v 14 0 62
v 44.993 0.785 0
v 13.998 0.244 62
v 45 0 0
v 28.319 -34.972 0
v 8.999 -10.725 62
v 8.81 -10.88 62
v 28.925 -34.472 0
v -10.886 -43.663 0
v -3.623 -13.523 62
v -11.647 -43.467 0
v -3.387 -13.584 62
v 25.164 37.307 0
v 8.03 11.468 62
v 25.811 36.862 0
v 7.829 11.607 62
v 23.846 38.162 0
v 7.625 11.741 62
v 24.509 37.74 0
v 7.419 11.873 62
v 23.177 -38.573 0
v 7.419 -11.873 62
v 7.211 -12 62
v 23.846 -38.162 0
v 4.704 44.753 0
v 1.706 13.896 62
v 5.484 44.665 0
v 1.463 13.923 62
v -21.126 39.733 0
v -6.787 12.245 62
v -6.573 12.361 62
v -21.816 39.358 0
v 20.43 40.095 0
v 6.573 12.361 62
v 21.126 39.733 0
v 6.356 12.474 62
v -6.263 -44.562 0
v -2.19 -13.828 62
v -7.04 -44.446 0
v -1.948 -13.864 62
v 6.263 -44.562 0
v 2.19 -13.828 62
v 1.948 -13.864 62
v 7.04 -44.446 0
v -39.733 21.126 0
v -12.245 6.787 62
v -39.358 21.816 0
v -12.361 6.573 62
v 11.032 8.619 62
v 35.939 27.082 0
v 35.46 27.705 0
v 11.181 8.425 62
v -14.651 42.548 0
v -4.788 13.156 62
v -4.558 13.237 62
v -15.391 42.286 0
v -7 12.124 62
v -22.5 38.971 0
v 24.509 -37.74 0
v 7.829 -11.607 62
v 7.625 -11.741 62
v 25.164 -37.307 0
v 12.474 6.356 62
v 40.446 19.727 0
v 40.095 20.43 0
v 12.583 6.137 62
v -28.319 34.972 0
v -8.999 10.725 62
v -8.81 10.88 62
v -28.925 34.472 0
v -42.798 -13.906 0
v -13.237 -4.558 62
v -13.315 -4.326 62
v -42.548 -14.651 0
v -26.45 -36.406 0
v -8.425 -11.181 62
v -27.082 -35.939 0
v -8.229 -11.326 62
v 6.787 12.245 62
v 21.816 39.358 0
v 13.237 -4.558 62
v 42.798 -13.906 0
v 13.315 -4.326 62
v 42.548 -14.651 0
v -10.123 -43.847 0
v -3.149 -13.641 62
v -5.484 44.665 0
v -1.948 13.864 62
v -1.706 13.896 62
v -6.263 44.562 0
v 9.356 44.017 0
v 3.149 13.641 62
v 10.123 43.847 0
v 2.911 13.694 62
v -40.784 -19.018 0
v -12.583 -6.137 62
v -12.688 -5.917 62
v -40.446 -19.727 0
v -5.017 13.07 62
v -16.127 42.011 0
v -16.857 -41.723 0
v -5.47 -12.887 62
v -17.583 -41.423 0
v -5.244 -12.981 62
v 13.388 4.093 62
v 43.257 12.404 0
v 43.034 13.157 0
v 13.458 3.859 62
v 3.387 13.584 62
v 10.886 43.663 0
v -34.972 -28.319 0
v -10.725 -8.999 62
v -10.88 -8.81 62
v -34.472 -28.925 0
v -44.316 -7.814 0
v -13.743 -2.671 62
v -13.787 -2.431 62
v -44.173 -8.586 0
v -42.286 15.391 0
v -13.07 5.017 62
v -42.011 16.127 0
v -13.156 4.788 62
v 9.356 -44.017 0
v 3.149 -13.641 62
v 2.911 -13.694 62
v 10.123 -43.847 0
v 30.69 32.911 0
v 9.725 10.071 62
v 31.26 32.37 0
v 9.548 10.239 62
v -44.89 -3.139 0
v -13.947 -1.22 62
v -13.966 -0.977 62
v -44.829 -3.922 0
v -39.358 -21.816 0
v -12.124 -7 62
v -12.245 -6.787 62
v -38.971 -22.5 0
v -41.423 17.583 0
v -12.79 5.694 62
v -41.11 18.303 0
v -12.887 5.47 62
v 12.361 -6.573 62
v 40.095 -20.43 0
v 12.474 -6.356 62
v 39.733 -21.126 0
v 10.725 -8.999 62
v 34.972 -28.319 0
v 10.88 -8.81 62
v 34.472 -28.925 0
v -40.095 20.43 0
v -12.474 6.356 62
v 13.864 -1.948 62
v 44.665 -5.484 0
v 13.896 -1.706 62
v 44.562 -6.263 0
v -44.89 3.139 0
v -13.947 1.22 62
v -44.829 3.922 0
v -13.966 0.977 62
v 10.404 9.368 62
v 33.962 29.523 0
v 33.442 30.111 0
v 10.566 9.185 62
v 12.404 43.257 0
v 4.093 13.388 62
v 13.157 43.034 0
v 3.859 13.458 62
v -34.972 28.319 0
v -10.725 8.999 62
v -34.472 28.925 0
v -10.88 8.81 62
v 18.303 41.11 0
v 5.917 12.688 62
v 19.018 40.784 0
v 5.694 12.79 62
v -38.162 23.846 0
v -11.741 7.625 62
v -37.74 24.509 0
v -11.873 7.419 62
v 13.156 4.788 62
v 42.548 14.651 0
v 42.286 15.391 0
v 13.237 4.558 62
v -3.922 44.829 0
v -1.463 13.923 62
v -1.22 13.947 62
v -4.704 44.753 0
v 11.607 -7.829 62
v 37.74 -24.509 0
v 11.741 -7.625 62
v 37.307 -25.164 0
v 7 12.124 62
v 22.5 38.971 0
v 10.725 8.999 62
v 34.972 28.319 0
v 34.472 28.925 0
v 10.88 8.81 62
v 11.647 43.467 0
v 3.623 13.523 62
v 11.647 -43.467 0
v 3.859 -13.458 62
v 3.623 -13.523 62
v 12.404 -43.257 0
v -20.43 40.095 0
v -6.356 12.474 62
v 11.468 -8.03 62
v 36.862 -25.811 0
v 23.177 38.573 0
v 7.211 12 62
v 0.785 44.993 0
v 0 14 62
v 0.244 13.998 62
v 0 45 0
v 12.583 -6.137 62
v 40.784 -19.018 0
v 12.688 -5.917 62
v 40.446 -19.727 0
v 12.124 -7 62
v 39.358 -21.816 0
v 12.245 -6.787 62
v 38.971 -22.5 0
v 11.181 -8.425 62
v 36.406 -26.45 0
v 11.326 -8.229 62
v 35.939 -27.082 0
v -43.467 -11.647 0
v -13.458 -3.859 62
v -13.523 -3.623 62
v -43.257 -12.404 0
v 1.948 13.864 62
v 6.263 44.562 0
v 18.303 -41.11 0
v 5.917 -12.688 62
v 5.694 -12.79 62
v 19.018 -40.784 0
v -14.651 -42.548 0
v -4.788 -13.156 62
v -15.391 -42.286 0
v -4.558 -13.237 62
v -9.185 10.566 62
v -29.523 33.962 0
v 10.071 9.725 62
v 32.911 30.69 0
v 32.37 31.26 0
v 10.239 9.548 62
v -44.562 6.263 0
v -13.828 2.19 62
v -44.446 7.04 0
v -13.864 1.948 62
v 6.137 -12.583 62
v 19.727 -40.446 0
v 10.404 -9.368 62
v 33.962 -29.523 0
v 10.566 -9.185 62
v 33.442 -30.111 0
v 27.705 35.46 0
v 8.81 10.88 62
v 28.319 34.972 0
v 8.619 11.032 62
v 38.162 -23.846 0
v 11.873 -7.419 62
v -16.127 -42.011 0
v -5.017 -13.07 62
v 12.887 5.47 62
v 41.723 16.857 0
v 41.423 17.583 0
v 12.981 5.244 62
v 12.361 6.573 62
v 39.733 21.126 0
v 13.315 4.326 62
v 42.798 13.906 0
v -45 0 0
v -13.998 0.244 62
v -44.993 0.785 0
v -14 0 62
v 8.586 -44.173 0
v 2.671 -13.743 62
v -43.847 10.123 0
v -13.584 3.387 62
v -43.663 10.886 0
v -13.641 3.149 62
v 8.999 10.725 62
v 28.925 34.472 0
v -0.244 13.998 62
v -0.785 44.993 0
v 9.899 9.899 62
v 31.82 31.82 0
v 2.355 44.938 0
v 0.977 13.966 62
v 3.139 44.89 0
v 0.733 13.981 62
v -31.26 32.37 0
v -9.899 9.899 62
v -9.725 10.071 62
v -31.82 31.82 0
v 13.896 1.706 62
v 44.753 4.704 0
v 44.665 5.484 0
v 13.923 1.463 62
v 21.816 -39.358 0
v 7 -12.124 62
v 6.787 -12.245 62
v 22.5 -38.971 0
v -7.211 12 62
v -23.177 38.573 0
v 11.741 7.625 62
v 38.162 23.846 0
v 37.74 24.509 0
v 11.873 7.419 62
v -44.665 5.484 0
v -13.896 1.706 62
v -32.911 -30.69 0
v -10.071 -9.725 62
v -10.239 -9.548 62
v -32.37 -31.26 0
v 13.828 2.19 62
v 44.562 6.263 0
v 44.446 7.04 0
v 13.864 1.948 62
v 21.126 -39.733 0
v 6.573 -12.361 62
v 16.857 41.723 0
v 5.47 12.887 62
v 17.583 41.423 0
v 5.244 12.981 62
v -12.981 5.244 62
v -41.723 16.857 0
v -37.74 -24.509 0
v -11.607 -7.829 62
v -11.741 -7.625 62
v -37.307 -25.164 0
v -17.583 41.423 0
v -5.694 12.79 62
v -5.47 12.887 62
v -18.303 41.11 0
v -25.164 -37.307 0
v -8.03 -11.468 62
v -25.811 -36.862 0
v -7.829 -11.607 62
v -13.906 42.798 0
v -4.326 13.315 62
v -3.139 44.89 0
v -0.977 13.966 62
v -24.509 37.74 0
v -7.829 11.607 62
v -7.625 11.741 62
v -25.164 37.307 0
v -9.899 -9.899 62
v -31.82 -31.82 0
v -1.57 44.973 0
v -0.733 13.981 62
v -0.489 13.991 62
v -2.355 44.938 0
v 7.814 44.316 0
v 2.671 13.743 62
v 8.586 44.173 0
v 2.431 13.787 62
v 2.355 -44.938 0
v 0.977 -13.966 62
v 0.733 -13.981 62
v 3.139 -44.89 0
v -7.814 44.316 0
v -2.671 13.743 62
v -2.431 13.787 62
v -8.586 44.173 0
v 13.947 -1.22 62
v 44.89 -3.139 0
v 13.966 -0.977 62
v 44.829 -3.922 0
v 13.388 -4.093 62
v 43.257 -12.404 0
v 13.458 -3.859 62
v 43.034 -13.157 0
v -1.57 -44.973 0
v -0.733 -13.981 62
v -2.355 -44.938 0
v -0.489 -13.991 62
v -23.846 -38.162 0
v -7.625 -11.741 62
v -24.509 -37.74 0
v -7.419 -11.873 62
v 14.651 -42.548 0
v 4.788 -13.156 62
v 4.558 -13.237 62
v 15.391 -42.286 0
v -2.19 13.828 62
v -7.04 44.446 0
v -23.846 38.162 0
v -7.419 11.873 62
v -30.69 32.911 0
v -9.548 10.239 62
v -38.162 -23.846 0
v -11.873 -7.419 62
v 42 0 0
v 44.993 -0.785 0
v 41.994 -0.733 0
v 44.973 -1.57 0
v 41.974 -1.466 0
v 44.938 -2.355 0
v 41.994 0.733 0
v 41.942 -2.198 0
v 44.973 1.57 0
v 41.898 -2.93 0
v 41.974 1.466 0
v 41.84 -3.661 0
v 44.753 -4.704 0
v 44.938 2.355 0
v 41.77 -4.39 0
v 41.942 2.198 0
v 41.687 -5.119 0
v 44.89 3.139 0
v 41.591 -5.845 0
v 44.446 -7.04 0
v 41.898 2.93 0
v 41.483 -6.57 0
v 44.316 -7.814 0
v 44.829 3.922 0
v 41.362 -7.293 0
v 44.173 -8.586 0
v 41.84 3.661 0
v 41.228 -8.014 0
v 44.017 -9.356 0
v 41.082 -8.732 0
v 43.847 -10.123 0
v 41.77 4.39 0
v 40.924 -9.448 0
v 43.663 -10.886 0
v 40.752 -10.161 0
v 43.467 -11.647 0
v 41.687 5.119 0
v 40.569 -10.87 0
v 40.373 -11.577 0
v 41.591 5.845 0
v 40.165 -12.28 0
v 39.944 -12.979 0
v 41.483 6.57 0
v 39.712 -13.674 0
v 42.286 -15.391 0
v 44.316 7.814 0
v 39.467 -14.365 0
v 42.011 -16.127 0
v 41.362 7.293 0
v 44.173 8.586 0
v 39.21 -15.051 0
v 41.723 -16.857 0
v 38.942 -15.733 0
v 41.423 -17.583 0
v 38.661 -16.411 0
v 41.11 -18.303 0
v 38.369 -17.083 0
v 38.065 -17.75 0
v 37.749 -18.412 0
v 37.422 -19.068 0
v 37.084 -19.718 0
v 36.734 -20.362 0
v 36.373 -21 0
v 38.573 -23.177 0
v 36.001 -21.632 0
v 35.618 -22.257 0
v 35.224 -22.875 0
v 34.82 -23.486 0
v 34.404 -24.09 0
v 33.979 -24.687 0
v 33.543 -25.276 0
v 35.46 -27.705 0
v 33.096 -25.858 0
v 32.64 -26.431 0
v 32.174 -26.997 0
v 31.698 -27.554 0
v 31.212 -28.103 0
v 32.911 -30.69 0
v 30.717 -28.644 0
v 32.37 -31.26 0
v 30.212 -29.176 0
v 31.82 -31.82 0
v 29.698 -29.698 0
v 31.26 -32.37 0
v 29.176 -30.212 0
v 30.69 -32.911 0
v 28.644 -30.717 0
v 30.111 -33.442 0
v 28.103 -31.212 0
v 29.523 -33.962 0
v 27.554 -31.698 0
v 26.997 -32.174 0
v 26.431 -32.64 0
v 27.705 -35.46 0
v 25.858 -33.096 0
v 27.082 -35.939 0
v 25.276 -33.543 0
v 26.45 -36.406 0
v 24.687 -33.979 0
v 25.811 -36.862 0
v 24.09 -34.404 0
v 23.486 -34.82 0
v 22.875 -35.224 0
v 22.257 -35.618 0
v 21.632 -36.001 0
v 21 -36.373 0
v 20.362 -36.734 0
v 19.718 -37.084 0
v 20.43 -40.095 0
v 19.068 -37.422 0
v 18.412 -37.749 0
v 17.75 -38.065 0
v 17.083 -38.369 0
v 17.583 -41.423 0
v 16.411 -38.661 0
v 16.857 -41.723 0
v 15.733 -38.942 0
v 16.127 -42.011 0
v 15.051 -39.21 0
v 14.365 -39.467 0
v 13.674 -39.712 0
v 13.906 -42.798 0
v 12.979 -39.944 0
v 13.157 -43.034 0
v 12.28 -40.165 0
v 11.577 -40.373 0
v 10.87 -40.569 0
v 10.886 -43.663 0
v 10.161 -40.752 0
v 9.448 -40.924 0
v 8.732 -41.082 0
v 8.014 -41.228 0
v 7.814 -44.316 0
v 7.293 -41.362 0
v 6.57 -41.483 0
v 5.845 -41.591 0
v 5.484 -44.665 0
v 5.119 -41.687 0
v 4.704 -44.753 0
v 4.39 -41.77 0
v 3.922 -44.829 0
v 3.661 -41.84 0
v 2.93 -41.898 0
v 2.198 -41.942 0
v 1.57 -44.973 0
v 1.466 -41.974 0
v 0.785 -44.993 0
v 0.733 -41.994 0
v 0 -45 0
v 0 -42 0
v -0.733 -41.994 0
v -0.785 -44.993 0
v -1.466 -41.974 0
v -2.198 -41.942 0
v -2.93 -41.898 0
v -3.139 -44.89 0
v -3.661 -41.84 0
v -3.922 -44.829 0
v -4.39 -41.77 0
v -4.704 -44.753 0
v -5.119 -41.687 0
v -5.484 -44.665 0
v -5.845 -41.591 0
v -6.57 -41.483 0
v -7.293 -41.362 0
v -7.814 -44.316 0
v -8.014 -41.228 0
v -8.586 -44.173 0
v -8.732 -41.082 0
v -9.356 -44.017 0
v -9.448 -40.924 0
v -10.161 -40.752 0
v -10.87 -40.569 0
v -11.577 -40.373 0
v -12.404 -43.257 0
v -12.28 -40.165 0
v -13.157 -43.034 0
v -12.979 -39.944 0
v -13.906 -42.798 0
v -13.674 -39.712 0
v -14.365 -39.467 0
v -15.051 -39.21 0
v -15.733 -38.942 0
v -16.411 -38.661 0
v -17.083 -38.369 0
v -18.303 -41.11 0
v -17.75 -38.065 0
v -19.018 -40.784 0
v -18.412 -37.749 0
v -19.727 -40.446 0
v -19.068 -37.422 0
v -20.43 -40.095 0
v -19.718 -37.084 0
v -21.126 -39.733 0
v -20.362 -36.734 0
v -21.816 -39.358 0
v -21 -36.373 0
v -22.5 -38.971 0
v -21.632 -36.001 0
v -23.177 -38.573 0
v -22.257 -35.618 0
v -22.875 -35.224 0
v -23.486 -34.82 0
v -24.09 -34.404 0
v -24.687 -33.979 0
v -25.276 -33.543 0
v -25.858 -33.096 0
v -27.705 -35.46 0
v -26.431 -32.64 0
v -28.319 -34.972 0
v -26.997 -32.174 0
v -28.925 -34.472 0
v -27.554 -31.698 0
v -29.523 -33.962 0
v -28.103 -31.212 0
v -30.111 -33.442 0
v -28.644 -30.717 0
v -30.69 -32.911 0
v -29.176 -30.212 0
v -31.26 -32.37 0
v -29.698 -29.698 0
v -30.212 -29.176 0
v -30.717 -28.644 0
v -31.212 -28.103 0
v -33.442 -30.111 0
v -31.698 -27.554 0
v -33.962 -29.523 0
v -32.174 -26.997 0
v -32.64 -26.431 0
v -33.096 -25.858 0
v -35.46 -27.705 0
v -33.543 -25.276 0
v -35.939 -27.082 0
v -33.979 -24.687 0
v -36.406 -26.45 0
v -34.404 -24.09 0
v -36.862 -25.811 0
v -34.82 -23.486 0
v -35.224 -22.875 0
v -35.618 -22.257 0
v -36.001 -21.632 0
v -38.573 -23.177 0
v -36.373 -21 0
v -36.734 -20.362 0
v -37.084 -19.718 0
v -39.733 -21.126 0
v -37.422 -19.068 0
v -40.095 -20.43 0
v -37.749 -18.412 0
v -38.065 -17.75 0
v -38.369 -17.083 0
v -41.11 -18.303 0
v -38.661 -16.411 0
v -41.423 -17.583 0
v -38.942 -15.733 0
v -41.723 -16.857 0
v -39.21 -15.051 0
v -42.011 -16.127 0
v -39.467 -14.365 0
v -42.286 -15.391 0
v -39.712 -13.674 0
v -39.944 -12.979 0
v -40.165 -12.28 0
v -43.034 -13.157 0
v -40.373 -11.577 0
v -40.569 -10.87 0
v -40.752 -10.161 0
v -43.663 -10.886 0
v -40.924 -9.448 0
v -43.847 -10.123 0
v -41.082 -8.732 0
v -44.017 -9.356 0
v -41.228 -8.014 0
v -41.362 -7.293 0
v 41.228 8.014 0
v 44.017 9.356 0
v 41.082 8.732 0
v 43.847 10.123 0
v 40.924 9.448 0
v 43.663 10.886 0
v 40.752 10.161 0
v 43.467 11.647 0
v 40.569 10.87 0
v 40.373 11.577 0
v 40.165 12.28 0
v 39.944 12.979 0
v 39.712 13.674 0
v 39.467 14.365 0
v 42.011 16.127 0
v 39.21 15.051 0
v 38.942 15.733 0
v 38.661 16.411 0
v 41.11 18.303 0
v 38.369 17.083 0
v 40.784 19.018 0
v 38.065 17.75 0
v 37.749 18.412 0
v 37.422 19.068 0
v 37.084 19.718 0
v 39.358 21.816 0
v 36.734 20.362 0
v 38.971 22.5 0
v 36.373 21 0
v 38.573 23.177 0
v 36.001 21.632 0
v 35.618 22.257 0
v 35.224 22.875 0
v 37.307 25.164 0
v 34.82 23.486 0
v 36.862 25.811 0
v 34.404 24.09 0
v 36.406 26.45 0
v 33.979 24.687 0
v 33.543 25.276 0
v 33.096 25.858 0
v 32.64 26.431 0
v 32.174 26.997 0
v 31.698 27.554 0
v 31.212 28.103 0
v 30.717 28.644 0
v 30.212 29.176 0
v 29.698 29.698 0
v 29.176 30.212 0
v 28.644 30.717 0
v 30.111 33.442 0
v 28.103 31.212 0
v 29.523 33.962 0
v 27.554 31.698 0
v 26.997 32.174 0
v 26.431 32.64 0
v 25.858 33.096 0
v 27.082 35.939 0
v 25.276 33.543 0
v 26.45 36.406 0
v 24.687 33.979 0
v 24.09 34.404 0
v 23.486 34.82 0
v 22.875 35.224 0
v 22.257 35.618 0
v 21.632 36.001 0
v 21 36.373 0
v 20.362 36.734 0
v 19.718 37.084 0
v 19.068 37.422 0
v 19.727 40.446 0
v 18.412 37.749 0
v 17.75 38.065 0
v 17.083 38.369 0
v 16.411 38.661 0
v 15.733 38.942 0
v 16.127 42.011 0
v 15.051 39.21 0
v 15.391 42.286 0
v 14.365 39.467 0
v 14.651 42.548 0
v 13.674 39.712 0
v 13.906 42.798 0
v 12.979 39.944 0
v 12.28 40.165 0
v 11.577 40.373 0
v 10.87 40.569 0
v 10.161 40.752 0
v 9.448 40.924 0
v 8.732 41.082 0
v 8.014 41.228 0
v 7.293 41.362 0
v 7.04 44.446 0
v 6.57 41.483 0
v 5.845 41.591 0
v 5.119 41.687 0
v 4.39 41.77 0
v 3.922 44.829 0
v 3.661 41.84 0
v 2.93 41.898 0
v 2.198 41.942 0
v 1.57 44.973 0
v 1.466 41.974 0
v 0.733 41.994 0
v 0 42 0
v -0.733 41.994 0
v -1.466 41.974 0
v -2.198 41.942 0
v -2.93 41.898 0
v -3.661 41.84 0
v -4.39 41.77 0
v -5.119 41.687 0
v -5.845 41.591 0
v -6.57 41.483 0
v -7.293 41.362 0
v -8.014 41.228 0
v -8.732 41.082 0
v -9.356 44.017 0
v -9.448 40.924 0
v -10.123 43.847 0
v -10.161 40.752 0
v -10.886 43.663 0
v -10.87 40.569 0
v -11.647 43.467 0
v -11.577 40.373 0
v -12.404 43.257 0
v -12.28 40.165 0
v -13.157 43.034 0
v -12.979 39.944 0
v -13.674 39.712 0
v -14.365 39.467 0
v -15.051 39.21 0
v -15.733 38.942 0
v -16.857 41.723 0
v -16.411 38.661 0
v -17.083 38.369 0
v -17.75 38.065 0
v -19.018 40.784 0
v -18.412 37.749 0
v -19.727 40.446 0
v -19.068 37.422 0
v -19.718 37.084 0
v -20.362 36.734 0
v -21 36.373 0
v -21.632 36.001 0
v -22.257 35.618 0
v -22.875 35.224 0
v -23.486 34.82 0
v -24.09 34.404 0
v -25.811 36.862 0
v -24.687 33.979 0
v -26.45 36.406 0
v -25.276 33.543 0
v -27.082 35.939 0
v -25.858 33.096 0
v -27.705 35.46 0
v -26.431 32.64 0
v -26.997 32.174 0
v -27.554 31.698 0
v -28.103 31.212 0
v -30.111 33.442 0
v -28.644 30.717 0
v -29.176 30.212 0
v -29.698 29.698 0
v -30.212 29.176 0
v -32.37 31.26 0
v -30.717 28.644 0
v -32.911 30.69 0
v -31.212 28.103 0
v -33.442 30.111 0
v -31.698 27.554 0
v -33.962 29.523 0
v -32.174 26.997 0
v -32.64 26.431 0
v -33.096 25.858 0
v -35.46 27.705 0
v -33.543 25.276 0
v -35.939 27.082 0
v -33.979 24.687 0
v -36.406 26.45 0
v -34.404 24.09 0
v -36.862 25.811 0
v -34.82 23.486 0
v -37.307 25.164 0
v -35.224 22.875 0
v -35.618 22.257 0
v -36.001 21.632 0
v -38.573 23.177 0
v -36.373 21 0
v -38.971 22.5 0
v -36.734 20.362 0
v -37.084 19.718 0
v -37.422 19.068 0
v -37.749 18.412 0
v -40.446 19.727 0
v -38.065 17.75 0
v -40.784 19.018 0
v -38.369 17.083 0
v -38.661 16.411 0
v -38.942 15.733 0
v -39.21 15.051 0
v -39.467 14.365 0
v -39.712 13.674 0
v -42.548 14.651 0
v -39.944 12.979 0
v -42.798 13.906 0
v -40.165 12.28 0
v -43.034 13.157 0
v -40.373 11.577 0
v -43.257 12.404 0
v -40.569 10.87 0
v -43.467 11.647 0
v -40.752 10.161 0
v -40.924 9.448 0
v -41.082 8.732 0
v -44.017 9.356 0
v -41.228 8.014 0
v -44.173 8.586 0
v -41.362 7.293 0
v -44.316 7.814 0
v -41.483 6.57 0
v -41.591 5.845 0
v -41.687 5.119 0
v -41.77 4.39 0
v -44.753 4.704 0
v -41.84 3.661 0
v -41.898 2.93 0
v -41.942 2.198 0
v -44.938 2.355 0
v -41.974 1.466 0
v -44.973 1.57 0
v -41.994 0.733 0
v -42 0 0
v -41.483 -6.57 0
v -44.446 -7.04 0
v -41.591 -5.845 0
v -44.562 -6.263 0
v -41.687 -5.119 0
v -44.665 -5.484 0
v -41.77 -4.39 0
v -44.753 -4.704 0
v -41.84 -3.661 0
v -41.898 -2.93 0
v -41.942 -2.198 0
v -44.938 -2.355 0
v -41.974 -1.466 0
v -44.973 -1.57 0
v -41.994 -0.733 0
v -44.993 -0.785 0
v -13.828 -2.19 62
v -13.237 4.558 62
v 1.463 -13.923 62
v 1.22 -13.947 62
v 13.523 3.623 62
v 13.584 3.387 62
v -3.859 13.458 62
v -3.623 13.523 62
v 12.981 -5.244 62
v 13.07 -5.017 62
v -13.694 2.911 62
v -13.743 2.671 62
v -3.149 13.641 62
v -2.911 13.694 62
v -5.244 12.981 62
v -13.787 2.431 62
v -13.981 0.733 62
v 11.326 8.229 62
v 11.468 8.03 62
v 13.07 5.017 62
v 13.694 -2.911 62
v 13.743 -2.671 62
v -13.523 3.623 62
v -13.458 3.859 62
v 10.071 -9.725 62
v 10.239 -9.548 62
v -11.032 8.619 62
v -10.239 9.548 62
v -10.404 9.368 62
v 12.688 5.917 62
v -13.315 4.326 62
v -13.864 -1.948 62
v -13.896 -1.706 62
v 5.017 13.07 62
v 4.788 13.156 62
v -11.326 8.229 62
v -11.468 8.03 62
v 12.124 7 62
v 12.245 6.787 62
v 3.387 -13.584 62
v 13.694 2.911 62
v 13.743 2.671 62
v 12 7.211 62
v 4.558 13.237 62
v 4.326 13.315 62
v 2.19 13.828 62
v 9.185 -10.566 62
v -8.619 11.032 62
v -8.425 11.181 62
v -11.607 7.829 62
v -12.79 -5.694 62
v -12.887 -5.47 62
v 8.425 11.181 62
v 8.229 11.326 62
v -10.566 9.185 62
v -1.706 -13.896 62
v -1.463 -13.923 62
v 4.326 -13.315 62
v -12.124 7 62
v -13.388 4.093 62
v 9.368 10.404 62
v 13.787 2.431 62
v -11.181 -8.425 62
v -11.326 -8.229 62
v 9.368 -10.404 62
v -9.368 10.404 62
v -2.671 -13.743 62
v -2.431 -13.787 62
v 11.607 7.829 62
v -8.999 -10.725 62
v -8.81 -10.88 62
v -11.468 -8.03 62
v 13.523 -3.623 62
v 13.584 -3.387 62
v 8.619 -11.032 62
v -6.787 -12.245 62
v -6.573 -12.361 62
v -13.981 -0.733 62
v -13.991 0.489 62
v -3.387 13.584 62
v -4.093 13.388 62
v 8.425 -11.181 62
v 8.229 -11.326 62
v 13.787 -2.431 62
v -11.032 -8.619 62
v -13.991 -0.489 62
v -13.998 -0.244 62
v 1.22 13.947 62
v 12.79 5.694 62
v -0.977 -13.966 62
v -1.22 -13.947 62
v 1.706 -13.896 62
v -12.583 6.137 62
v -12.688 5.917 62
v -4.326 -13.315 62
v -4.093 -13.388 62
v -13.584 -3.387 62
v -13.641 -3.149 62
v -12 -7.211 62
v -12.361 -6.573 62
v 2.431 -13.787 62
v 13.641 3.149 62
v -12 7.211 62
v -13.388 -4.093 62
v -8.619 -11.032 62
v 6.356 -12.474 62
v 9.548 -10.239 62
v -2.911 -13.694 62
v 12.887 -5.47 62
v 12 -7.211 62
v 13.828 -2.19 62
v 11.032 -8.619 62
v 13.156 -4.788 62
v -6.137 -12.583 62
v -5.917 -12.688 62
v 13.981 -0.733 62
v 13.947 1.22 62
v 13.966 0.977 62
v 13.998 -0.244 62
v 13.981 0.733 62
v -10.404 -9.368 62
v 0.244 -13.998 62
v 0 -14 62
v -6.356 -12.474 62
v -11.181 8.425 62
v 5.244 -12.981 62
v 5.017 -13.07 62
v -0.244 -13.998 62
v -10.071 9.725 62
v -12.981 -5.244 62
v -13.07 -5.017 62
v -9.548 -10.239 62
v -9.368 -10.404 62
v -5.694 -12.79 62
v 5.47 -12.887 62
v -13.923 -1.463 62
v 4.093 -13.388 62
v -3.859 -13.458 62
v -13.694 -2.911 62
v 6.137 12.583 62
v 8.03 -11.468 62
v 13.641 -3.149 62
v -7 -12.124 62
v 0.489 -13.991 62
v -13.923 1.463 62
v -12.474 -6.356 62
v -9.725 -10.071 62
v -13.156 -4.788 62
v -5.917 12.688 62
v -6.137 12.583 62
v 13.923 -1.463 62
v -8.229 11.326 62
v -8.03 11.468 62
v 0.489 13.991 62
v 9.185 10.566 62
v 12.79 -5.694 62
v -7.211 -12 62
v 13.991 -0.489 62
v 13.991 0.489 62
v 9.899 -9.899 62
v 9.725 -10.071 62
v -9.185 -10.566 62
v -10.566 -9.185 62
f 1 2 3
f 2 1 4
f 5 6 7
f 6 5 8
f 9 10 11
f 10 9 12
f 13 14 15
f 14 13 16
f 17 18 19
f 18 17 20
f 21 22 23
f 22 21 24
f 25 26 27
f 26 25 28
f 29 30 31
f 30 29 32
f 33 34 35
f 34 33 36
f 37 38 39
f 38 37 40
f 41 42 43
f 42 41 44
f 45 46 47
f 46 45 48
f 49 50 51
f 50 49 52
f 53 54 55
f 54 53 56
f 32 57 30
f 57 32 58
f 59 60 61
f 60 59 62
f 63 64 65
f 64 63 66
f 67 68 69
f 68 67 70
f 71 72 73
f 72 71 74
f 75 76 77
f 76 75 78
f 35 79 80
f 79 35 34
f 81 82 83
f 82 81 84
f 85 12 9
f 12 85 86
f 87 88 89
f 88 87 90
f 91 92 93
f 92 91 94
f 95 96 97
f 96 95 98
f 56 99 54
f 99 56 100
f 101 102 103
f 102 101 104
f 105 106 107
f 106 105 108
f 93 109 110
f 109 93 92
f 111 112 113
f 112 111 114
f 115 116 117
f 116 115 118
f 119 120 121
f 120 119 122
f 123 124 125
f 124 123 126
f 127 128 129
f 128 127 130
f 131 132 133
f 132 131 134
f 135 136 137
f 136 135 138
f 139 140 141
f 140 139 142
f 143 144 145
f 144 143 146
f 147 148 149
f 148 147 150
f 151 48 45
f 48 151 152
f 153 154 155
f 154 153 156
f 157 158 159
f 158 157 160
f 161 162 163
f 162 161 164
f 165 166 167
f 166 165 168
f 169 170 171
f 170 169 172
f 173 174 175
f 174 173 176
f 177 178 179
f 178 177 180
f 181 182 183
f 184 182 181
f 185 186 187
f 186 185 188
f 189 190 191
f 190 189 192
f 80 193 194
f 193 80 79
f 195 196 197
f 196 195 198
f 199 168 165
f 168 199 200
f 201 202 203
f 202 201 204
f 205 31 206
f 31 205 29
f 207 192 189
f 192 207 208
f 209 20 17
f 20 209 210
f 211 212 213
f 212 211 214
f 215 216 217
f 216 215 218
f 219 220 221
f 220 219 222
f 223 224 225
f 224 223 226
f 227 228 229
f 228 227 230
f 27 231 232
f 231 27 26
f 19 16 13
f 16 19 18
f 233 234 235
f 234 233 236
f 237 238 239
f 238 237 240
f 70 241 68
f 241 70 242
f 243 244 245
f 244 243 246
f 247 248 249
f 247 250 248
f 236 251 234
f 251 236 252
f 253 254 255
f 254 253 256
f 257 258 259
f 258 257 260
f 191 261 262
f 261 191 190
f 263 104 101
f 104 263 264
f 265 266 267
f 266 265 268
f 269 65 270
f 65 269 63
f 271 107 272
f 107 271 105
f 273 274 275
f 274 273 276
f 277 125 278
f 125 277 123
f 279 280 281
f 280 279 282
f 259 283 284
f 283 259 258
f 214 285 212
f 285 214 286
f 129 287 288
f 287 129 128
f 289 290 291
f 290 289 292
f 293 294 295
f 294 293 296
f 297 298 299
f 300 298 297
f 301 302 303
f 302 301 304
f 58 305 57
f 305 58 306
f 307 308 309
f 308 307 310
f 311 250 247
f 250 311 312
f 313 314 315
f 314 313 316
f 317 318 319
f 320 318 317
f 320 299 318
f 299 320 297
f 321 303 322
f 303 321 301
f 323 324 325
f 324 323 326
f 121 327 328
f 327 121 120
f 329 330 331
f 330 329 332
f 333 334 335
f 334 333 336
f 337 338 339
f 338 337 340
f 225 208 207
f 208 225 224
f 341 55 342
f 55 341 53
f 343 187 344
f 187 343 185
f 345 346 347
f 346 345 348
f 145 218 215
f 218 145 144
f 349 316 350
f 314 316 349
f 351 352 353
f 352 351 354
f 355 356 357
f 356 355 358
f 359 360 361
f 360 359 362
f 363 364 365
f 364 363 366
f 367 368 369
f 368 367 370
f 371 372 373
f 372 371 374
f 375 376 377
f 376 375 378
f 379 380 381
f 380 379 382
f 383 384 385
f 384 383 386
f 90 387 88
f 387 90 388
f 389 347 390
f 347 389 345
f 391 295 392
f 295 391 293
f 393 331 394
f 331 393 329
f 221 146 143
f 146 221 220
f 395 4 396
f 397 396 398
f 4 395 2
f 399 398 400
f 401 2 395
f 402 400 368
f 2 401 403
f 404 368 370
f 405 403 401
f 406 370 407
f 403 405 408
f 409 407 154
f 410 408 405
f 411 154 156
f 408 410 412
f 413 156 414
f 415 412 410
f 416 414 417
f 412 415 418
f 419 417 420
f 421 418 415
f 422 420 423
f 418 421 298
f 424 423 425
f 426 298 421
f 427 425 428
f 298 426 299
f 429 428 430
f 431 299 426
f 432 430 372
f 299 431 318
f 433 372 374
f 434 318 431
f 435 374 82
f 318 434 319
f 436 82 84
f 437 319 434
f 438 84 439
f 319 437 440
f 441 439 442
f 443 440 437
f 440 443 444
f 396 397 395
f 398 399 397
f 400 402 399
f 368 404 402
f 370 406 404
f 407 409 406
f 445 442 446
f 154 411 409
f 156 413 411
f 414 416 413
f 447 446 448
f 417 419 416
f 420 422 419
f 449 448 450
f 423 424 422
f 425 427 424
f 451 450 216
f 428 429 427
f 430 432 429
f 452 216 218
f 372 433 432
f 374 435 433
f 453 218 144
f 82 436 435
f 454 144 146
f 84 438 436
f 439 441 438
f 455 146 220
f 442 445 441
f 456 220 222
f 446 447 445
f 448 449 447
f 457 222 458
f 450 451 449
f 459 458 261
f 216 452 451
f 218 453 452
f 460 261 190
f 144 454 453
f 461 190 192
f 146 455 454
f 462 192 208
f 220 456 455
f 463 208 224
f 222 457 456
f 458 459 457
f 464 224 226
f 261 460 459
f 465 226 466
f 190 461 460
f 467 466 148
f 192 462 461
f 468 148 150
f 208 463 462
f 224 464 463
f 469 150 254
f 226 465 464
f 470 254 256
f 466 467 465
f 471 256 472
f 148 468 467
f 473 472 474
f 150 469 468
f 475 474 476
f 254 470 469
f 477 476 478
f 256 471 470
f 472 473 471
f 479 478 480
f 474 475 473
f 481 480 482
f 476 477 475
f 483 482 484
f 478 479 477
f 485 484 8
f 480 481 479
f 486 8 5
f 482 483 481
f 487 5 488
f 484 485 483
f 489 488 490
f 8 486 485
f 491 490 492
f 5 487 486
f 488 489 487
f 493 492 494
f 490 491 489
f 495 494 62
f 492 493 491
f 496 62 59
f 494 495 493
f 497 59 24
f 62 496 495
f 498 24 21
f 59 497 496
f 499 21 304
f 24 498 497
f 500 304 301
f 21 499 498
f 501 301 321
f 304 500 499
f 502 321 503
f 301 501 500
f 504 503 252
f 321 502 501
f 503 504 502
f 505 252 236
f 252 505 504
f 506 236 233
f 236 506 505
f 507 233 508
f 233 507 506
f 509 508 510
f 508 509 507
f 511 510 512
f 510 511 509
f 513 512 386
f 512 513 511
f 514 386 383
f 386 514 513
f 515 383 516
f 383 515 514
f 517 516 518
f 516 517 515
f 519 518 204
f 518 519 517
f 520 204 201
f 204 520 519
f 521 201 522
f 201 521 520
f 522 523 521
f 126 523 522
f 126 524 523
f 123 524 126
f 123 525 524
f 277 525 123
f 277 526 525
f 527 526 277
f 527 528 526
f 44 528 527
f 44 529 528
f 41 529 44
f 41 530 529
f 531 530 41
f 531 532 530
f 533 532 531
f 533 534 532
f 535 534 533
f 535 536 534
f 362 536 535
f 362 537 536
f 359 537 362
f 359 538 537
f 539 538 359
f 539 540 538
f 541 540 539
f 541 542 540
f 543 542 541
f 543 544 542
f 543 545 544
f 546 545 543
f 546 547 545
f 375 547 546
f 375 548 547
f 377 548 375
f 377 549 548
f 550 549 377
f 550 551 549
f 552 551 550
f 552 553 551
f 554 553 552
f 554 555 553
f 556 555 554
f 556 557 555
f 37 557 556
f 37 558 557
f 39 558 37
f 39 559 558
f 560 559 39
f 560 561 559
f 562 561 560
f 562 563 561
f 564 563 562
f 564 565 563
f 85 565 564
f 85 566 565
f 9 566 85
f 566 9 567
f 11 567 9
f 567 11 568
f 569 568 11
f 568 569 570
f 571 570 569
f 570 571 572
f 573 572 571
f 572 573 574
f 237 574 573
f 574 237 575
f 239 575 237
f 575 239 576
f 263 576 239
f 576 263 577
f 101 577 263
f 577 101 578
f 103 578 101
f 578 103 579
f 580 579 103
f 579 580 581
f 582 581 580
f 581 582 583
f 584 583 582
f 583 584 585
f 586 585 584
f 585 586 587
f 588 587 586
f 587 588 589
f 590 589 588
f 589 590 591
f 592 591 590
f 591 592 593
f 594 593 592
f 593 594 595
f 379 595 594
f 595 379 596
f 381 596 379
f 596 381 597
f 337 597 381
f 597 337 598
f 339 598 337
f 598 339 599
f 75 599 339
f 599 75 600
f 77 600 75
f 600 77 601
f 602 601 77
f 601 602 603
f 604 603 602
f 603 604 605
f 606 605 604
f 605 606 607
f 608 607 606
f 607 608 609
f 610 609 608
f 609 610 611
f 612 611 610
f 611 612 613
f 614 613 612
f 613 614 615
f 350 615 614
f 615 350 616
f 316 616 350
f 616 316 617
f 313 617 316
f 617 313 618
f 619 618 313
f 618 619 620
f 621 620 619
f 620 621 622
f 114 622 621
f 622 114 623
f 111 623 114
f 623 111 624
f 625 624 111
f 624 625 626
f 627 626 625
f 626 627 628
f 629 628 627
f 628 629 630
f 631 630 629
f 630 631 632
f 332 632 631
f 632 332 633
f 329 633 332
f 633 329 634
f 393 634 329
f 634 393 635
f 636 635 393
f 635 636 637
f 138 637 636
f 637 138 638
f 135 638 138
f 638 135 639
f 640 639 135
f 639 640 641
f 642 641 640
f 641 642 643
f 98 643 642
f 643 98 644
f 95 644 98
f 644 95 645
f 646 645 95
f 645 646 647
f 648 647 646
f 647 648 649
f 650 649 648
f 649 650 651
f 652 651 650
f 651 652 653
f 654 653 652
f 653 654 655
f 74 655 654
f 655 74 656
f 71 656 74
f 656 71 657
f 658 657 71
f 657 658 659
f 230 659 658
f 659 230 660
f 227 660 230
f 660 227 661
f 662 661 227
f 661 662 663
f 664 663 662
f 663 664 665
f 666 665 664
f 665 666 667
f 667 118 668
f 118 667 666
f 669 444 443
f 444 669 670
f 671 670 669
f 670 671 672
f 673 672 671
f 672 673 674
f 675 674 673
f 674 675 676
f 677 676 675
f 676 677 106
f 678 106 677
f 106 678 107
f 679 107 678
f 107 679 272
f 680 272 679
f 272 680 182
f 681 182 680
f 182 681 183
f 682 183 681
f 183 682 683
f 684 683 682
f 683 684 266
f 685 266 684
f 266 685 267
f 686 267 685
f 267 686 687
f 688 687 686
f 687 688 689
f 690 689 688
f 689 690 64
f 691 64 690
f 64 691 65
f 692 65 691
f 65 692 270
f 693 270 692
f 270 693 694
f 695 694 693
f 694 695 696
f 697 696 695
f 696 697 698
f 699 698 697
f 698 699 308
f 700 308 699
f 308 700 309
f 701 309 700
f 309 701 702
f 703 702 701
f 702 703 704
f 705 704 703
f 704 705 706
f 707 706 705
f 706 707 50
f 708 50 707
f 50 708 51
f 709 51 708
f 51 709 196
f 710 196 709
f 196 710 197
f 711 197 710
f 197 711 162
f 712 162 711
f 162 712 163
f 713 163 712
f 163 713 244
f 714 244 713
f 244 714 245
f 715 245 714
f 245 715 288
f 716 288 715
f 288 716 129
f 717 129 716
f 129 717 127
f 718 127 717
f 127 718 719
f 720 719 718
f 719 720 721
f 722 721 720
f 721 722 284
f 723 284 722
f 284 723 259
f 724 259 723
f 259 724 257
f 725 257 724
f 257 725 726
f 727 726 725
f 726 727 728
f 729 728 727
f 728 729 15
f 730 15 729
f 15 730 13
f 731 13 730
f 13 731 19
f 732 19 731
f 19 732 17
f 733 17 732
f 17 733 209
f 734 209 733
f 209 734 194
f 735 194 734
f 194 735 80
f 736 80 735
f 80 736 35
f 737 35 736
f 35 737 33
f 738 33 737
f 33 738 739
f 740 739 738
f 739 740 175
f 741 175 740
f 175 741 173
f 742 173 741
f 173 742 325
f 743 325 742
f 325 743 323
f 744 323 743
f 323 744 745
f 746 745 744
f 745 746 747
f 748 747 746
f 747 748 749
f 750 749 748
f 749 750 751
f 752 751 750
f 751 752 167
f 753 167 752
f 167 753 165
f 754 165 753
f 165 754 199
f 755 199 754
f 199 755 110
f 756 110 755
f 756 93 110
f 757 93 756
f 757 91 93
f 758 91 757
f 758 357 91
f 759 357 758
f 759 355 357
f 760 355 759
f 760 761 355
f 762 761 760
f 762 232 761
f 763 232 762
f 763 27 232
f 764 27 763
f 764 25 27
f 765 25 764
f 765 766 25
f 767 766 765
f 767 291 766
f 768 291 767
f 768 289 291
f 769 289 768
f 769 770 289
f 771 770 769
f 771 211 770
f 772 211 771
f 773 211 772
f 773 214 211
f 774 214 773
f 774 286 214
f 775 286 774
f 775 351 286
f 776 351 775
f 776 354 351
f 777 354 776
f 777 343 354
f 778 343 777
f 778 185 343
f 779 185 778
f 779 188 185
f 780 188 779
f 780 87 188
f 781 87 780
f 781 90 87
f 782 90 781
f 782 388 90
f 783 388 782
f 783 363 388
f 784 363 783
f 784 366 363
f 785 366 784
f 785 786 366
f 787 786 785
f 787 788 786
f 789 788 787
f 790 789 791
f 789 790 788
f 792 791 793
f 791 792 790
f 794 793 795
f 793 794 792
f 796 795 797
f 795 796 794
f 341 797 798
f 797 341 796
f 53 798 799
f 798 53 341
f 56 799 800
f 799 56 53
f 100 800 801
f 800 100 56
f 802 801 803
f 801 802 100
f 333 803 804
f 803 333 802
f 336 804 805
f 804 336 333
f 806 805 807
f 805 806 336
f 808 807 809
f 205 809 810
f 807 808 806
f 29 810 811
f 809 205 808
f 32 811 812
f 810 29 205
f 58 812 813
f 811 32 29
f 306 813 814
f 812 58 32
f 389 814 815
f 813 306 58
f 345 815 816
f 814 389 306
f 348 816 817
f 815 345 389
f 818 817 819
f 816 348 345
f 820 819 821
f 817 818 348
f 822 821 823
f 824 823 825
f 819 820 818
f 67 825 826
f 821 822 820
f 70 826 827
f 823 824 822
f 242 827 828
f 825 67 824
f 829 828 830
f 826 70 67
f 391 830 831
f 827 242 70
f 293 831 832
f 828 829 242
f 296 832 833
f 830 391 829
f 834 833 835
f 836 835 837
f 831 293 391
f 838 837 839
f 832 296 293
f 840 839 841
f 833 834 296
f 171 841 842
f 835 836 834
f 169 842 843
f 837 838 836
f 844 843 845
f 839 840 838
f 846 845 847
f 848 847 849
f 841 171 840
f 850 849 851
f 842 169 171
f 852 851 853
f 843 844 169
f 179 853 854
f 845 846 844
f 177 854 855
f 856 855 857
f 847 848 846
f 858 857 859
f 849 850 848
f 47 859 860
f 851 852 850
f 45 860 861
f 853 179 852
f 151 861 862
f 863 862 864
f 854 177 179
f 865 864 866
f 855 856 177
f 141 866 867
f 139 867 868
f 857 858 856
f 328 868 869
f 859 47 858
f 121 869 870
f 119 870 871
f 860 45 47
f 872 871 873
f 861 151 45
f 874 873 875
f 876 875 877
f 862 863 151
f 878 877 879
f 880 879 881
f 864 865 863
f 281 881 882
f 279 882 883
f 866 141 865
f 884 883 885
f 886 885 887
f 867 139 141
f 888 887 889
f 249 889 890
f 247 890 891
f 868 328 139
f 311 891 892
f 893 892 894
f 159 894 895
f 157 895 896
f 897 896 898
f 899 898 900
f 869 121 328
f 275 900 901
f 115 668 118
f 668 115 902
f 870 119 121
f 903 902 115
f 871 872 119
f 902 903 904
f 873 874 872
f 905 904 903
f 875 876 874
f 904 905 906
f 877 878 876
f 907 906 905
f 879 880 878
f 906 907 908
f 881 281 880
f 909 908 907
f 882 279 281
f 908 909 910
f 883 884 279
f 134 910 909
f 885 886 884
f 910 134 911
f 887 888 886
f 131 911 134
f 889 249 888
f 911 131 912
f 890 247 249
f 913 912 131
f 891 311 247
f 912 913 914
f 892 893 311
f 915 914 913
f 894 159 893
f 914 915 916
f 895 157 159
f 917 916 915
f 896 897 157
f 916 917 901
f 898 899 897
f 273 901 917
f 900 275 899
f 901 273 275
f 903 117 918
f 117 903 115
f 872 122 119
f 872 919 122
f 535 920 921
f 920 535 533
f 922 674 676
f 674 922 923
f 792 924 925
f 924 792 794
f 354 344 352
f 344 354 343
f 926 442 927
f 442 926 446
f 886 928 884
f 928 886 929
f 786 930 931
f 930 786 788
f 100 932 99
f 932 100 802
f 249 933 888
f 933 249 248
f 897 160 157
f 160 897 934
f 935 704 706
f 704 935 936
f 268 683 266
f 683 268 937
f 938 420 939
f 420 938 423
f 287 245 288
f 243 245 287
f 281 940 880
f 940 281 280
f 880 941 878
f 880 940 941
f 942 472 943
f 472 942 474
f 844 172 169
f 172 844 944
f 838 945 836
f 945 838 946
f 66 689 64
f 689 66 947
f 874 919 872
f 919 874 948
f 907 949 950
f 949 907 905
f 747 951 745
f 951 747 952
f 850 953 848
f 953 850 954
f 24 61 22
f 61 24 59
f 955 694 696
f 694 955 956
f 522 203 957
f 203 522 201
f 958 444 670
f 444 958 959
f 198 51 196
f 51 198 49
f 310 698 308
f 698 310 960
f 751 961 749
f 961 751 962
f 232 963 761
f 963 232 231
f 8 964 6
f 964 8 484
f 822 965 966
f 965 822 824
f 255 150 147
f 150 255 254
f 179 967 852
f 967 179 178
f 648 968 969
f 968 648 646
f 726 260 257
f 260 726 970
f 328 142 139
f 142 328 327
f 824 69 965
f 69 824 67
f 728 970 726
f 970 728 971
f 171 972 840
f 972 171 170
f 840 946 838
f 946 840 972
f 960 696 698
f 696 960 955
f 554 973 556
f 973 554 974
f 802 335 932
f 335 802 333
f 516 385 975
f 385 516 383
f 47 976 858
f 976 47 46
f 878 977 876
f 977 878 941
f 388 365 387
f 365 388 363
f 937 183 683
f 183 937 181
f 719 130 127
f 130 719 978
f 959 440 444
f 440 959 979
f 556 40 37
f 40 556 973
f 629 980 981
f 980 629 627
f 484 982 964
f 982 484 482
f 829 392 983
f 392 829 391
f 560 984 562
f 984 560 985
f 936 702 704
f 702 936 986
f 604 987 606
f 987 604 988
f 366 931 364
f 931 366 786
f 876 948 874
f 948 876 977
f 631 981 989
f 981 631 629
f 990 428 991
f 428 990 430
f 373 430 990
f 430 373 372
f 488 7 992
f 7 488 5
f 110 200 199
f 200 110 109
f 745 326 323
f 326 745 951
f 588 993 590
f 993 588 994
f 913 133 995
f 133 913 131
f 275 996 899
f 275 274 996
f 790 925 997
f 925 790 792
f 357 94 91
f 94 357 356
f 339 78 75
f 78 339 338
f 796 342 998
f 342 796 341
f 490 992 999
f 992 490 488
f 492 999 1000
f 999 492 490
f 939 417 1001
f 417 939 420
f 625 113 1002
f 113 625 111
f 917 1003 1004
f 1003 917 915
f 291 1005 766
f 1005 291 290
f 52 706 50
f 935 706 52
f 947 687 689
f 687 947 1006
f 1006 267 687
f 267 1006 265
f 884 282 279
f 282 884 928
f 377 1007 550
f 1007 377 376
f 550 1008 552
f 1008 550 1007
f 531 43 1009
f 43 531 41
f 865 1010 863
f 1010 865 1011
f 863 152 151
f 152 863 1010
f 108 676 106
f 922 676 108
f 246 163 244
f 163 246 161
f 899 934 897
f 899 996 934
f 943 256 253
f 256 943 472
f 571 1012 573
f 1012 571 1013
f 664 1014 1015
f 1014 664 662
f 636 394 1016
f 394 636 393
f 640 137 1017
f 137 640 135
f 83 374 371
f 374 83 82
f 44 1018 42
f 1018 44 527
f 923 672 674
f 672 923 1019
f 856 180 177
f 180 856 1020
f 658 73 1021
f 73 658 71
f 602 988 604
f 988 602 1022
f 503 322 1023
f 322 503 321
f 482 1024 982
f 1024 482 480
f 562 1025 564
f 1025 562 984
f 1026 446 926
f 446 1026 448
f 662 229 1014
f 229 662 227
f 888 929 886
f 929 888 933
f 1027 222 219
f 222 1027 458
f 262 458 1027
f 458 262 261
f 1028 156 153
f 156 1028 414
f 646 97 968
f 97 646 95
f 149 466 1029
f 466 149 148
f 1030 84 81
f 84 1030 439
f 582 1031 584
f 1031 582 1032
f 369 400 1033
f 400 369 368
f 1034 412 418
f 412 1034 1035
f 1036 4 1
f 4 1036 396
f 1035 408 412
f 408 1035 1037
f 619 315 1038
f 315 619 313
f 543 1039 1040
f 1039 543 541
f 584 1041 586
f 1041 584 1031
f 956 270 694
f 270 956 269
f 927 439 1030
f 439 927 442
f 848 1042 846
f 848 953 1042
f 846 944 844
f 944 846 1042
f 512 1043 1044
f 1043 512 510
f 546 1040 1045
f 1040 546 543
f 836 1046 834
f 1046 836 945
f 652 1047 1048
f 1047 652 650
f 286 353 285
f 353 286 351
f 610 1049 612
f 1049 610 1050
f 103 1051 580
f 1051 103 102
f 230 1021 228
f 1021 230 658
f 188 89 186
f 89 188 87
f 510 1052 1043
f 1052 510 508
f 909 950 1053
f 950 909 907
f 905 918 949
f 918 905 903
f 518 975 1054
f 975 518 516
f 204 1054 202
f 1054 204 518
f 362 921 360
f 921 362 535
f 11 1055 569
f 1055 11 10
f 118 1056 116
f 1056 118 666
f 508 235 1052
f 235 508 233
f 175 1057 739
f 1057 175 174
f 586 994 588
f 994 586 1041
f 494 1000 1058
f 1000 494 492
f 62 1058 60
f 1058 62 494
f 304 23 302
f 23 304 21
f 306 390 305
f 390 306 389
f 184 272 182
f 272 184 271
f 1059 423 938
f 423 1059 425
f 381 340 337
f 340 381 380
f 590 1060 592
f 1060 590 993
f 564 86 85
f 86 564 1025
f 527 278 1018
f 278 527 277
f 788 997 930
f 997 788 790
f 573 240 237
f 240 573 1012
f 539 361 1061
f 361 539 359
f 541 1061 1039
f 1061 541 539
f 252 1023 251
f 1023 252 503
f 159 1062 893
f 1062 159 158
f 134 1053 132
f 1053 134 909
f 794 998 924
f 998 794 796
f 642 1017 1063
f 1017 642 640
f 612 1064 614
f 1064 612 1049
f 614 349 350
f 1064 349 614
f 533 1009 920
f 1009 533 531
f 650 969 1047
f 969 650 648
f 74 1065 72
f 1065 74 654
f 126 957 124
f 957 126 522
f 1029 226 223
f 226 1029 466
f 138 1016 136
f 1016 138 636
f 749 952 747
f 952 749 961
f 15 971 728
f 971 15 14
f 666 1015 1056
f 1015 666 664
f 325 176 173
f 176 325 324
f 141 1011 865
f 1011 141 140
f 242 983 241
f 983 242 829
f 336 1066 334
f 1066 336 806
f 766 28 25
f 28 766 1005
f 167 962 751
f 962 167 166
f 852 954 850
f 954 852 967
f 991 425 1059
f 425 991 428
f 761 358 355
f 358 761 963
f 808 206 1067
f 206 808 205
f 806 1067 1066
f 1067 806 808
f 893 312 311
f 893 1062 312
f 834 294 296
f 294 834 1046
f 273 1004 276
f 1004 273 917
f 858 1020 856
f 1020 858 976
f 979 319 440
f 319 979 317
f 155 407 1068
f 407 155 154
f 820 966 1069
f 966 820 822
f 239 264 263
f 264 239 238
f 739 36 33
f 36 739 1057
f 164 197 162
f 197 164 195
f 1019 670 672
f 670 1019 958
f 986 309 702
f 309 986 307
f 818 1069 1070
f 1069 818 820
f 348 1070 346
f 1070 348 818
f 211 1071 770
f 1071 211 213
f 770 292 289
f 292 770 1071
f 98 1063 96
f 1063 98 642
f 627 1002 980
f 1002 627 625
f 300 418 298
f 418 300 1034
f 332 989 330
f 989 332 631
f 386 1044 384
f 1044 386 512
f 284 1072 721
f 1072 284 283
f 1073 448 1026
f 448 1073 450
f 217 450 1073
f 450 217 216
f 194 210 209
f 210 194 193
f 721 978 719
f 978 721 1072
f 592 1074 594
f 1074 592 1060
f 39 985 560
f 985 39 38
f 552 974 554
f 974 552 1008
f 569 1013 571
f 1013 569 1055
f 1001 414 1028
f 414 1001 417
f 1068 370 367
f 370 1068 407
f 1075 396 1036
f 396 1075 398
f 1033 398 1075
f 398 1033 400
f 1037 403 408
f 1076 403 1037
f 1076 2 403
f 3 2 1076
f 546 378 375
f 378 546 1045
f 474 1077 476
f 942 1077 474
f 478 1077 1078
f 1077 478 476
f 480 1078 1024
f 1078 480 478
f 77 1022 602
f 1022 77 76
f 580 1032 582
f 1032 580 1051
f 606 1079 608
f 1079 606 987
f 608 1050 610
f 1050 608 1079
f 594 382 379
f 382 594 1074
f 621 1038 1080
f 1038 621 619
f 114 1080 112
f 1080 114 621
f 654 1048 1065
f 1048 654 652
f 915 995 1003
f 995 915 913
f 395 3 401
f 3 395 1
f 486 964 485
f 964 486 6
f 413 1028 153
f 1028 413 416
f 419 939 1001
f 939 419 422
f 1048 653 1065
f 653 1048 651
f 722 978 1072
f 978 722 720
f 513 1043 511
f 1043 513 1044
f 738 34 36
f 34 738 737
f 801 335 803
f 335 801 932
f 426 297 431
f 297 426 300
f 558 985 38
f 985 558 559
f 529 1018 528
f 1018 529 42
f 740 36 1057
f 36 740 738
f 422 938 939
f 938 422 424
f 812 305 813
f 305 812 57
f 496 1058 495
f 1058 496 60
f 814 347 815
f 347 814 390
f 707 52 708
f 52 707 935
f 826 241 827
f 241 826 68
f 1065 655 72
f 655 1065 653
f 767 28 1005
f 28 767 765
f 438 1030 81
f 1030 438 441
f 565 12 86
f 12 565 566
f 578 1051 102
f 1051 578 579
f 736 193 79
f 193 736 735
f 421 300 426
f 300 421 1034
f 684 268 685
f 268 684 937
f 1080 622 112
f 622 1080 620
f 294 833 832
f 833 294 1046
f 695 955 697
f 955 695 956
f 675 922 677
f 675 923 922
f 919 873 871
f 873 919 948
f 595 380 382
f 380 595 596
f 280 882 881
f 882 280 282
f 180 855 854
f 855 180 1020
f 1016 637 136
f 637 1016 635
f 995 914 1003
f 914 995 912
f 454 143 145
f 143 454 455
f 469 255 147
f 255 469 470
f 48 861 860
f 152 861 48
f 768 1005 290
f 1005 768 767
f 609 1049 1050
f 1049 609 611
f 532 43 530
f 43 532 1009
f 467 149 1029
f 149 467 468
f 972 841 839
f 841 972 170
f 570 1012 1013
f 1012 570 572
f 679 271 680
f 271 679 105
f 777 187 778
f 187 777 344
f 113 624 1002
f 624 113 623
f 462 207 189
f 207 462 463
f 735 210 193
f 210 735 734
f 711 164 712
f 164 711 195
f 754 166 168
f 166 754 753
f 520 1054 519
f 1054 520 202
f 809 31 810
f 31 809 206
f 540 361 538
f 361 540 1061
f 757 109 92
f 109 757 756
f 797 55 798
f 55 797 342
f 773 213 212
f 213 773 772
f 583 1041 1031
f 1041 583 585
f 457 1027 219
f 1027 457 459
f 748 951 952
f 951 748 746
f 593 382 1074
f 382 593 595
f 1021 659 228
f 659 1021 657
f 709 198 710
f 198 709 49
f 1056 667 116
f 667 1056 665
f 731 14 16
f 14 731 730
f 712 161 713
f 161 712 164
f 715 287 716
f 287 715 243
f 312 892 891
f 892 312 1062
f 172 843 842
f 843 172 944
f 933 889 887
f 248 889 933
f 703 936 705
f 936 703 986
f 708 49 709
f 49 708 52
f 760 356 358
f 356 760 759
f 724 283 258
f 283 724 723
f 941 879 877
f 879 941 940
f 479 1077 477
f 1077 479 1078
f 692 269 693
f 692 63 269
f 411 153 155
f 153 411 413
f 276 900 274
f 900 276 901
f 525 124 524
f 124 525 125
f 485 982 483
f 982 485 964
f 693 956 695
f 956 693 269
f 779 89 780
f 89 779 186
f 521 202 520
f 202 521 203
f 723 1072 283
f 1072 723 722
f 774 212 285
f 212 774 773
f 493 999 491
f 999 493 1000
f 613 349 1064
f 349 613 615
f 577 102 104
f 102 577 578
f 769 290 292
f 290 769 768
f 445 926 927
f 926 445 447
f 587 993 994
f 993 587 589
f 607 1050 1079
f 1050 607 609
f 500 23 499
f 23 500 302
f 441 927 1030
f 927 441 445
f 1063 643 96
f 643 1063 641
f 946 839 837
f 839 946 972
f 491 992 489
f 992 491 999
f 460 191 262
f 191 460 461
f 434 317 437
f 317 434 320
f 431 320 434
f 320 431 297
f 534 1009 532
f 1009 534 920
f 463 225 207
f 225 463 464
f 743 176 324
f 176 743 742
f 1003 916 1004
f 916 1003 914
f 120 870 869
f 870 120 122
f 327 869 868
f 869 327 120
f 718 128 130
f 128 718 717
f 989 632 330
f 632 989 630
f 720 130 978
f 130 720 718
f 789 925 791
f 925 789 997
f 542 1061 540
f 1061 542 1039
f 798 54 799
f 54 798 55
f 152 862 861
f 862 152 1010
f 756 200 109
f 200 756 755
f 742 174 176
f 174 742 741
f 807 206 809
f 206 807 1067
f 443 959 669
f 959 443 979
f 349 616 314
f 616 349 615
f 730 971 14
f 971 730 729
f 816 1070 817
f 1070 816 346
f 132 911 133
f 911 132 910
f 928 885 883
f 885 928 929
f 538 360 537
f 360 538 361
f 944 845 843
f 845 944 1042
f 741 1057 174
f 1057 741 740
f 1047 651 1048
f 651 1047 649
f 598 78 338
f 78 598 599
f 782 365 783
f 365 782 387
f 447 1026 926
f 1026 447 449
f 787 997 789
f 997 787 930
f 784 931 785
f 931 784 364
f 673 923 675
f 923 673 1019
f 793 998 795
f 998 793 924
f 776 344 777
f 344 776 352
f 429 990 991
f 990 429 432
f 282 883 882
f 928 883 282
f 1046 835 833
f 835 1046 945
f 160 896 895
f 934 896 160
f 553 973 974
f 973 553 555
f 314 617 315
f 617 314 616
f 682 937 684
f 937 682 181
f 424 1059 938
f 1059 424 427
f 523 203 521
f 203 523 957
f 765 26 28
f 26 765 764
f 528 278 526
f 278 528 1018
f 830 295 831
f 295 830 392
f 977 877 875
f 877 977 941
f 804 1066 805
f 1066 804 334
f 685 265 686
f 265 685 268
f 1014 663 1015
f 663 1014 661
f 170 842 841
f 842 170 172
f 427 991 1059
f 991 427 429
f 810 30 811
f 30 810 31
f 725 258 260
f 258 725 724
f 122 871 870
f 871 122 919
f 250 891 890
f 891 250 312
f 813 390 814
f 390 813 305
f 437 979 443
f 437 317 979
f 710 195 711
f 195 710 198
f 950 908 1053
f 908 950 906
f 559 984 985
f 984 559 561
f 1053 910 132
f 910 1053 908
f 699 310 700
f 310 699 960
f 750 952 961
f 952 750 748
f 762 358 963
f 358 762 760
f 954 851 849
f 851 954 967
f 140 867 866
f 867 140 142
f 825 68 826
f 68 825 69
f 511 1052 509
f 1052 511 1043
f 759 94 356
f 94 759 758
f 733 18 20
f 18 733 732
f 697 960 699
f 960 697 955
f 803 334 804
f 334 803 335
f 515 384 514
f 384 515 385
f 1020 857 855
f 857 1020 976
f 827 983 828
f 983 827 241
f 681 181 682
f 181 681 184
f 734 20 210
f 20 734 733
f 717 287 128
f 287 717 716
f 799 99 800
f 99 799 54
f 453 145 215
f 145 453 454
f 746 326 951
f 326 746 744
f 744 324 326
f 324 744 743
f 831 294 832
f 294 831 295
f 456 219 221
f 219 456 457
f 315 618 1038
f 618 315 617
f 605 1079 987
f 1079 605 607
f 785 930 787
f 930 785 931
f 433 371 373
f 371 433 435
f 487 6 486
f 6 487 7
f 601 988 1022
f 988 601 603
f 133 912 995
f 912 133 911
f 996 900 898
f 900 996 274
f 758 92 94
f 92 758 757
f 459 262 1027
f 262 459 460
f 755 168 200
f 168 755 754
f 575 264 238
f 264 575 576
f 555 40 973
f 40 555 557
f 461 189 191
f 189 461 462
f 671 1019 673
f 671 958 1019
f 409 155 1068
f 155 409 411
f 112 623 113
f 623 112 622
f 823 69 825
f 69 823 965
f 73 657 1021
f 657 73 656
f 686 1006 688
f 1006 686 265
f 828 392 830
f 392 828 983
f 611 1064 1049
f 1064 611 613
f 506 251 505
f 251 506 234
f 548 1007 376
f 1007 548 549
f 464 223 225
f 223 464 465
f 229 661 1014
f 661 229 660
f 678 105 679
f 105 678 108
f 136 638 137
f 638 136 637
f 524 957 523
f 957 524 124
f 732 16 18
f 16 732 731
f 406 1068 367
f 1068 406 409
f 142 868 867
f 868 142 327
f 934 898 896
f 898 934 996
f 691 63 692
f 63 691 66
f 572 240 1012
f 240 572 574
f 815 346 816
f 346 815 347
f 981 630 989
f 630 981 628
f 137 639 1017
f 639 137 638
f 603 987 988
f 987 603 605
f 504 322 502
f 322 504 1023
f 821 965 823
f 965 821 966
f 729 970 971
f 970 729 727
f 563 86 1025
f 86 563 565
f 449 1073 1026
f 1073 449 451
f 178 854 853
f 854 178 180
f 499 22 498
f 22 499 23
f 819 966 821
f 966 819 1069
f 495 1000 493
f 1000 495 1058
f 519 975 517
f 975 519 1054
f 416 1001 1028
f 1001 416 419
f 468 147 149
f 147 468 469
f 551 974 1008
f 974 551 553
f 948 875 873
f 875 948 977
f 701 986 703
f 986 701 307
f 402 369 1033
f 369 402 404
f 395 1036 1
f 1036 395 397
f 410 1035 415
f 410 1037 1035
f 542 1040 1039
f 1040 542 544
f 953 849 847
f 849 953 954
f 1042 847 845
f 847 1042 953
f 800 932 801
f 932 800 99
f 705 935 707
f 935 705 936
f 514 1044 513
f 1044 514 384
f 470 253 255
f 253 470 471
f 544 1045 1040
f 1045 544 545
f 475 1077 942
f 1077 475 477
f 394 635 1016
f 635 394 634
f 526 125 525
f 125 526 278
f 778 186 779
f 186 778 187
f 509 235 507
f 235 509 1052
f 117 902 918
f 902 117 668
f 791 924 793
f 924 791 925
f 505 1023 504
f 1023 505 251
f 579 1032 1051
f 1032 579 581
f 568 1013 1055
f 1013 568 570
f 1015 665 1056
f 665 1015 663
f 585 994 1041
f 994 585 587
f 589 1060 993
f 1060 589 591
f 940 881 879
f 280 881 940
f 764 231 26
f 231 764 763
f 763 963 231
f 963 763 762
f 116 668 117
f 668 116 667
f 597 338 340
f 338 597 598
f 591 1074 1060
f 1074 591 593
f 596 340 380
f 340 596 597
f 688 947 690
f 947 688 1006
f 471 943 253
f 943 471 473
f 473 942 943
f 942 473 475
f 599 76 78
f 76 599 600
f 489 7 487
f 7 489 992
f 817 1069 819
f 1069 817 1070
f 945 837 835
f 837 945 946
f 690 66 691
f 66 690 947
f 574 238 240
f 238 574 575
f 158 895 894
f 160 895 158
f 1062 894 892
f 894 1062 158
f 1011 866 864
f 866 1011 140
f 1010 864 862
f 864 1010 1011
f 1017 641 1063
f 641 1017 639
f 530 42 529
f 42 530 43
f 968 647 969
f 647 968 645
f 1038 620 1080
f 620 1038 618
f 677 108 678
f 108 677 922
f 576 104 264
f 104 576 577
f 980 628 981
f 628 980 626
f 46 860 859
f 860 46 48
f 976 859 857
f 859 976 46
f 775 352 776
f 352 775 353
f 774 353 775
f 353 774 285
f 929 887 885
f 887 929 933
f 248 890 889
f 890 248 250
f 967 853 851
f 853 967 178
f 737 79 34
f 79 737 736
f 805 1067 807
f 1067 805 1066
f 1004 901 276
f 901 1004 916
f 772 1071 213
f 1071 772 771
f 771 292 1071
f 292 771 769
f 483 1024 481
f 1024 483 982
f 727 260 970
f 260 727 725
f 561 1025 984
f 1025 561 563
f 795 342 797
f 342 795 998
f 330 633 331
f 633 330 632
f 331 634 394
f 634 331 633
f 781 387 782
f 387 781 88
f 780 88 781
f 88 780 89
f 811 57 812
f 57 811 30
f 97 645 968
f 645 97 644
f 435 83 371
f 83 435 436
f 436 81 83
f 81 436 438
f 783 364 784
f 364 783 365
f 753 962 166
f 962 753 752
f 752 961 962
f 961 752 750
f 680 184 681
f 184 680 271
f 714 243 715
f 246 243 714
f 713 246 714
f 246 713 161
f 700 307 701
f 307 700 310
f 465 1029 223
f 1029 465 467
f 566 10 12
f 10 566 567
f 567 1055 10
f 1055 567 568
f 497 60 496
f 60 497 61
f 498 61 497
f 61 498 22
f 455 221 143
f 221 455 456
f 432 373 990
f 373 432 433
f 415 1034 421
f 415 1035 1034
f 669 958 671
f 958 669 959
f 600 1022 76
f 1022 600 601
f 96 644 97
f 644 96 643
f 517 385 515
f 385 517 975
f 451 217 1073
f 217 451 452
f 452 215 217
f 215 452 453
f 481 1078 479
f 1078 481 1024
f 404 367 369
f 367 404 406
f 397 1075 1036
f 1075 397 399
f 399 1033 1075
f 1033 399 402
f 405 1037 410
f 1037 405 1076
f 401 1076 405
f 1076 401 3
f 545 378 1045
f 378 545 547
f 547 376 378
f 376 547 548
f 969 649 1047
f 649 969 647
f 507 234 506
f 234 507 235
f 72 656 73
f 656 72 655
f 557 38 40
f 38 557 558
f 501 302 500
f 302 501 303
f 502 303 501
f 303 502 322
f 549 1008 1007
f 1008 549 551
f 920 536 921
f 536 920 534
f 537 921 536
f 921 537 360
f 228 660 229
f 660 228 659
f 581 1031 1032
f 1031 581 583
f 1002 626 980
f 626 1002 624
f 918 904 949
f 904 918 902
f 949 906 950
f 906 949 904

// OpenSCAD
$fs = 0.5;
$fa = 1;

difference() {
	cylinder(r1=45, r2=0, h=90);
	cylinder(r1=42, r2=0, h=93);
}
